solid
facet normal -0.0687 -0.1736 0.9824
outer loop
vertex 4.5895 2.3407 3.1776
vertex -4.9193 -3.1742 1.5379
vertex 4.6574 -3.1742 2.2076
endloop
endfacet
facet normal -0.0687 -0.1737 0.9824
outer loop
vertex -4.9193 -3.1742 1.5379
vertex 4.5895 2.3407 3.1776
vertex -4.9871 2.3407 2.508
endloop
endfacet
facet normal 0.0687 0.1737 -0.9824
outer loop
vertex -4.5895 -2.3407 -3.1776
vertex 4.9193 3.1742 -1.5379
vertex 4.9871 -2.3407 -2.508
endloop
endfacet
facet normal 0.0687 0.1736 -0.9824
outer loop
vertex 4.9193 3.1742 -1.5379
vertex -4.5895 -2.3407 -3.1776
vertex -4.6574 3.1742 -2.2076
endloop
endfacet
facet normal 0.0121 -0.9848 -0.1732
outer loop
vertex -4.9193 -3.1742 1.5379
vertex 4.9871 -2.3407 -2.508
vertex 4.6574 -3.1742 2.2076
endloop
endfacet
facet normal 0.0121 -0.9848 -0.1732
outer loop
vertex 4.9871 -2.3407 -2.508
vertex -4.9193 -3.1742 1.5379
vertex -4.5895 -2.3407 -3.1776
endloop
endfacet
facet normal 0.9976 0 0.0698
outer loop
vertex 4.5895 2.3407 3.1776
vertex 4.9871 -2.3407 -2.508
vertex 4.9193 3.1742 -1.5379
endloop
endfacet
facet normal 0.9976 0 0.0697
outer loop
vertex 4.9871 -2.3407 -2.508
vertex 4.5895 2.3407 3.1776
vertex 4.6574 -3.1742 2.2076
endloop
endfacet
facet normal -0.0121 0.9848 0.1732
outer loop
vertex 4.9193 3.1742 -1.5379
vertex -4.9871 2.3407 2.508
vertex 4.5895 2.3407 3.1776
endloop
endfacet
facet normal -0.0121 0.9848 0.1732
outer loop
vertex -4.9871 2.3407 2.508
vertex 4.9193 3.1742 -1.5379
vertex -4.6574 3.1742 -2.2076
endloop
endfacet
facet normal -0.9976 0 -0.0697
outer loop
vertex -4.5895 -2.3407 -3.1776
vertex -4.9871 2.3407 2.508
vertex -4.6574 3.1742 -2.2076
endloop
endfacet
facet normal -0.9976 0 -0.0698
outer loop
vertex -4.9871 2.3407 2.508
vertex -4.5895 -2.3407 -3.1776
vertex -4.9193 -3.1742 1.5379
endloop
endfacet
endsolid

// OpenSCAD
//andesite alloy for minetest mod fabricate

size = 8;//block=32 //item=8


rotate([10, -4, 0]) {
  cube([size * 1.2, size * 0.7, size * 0.6], center = true);

}
;
